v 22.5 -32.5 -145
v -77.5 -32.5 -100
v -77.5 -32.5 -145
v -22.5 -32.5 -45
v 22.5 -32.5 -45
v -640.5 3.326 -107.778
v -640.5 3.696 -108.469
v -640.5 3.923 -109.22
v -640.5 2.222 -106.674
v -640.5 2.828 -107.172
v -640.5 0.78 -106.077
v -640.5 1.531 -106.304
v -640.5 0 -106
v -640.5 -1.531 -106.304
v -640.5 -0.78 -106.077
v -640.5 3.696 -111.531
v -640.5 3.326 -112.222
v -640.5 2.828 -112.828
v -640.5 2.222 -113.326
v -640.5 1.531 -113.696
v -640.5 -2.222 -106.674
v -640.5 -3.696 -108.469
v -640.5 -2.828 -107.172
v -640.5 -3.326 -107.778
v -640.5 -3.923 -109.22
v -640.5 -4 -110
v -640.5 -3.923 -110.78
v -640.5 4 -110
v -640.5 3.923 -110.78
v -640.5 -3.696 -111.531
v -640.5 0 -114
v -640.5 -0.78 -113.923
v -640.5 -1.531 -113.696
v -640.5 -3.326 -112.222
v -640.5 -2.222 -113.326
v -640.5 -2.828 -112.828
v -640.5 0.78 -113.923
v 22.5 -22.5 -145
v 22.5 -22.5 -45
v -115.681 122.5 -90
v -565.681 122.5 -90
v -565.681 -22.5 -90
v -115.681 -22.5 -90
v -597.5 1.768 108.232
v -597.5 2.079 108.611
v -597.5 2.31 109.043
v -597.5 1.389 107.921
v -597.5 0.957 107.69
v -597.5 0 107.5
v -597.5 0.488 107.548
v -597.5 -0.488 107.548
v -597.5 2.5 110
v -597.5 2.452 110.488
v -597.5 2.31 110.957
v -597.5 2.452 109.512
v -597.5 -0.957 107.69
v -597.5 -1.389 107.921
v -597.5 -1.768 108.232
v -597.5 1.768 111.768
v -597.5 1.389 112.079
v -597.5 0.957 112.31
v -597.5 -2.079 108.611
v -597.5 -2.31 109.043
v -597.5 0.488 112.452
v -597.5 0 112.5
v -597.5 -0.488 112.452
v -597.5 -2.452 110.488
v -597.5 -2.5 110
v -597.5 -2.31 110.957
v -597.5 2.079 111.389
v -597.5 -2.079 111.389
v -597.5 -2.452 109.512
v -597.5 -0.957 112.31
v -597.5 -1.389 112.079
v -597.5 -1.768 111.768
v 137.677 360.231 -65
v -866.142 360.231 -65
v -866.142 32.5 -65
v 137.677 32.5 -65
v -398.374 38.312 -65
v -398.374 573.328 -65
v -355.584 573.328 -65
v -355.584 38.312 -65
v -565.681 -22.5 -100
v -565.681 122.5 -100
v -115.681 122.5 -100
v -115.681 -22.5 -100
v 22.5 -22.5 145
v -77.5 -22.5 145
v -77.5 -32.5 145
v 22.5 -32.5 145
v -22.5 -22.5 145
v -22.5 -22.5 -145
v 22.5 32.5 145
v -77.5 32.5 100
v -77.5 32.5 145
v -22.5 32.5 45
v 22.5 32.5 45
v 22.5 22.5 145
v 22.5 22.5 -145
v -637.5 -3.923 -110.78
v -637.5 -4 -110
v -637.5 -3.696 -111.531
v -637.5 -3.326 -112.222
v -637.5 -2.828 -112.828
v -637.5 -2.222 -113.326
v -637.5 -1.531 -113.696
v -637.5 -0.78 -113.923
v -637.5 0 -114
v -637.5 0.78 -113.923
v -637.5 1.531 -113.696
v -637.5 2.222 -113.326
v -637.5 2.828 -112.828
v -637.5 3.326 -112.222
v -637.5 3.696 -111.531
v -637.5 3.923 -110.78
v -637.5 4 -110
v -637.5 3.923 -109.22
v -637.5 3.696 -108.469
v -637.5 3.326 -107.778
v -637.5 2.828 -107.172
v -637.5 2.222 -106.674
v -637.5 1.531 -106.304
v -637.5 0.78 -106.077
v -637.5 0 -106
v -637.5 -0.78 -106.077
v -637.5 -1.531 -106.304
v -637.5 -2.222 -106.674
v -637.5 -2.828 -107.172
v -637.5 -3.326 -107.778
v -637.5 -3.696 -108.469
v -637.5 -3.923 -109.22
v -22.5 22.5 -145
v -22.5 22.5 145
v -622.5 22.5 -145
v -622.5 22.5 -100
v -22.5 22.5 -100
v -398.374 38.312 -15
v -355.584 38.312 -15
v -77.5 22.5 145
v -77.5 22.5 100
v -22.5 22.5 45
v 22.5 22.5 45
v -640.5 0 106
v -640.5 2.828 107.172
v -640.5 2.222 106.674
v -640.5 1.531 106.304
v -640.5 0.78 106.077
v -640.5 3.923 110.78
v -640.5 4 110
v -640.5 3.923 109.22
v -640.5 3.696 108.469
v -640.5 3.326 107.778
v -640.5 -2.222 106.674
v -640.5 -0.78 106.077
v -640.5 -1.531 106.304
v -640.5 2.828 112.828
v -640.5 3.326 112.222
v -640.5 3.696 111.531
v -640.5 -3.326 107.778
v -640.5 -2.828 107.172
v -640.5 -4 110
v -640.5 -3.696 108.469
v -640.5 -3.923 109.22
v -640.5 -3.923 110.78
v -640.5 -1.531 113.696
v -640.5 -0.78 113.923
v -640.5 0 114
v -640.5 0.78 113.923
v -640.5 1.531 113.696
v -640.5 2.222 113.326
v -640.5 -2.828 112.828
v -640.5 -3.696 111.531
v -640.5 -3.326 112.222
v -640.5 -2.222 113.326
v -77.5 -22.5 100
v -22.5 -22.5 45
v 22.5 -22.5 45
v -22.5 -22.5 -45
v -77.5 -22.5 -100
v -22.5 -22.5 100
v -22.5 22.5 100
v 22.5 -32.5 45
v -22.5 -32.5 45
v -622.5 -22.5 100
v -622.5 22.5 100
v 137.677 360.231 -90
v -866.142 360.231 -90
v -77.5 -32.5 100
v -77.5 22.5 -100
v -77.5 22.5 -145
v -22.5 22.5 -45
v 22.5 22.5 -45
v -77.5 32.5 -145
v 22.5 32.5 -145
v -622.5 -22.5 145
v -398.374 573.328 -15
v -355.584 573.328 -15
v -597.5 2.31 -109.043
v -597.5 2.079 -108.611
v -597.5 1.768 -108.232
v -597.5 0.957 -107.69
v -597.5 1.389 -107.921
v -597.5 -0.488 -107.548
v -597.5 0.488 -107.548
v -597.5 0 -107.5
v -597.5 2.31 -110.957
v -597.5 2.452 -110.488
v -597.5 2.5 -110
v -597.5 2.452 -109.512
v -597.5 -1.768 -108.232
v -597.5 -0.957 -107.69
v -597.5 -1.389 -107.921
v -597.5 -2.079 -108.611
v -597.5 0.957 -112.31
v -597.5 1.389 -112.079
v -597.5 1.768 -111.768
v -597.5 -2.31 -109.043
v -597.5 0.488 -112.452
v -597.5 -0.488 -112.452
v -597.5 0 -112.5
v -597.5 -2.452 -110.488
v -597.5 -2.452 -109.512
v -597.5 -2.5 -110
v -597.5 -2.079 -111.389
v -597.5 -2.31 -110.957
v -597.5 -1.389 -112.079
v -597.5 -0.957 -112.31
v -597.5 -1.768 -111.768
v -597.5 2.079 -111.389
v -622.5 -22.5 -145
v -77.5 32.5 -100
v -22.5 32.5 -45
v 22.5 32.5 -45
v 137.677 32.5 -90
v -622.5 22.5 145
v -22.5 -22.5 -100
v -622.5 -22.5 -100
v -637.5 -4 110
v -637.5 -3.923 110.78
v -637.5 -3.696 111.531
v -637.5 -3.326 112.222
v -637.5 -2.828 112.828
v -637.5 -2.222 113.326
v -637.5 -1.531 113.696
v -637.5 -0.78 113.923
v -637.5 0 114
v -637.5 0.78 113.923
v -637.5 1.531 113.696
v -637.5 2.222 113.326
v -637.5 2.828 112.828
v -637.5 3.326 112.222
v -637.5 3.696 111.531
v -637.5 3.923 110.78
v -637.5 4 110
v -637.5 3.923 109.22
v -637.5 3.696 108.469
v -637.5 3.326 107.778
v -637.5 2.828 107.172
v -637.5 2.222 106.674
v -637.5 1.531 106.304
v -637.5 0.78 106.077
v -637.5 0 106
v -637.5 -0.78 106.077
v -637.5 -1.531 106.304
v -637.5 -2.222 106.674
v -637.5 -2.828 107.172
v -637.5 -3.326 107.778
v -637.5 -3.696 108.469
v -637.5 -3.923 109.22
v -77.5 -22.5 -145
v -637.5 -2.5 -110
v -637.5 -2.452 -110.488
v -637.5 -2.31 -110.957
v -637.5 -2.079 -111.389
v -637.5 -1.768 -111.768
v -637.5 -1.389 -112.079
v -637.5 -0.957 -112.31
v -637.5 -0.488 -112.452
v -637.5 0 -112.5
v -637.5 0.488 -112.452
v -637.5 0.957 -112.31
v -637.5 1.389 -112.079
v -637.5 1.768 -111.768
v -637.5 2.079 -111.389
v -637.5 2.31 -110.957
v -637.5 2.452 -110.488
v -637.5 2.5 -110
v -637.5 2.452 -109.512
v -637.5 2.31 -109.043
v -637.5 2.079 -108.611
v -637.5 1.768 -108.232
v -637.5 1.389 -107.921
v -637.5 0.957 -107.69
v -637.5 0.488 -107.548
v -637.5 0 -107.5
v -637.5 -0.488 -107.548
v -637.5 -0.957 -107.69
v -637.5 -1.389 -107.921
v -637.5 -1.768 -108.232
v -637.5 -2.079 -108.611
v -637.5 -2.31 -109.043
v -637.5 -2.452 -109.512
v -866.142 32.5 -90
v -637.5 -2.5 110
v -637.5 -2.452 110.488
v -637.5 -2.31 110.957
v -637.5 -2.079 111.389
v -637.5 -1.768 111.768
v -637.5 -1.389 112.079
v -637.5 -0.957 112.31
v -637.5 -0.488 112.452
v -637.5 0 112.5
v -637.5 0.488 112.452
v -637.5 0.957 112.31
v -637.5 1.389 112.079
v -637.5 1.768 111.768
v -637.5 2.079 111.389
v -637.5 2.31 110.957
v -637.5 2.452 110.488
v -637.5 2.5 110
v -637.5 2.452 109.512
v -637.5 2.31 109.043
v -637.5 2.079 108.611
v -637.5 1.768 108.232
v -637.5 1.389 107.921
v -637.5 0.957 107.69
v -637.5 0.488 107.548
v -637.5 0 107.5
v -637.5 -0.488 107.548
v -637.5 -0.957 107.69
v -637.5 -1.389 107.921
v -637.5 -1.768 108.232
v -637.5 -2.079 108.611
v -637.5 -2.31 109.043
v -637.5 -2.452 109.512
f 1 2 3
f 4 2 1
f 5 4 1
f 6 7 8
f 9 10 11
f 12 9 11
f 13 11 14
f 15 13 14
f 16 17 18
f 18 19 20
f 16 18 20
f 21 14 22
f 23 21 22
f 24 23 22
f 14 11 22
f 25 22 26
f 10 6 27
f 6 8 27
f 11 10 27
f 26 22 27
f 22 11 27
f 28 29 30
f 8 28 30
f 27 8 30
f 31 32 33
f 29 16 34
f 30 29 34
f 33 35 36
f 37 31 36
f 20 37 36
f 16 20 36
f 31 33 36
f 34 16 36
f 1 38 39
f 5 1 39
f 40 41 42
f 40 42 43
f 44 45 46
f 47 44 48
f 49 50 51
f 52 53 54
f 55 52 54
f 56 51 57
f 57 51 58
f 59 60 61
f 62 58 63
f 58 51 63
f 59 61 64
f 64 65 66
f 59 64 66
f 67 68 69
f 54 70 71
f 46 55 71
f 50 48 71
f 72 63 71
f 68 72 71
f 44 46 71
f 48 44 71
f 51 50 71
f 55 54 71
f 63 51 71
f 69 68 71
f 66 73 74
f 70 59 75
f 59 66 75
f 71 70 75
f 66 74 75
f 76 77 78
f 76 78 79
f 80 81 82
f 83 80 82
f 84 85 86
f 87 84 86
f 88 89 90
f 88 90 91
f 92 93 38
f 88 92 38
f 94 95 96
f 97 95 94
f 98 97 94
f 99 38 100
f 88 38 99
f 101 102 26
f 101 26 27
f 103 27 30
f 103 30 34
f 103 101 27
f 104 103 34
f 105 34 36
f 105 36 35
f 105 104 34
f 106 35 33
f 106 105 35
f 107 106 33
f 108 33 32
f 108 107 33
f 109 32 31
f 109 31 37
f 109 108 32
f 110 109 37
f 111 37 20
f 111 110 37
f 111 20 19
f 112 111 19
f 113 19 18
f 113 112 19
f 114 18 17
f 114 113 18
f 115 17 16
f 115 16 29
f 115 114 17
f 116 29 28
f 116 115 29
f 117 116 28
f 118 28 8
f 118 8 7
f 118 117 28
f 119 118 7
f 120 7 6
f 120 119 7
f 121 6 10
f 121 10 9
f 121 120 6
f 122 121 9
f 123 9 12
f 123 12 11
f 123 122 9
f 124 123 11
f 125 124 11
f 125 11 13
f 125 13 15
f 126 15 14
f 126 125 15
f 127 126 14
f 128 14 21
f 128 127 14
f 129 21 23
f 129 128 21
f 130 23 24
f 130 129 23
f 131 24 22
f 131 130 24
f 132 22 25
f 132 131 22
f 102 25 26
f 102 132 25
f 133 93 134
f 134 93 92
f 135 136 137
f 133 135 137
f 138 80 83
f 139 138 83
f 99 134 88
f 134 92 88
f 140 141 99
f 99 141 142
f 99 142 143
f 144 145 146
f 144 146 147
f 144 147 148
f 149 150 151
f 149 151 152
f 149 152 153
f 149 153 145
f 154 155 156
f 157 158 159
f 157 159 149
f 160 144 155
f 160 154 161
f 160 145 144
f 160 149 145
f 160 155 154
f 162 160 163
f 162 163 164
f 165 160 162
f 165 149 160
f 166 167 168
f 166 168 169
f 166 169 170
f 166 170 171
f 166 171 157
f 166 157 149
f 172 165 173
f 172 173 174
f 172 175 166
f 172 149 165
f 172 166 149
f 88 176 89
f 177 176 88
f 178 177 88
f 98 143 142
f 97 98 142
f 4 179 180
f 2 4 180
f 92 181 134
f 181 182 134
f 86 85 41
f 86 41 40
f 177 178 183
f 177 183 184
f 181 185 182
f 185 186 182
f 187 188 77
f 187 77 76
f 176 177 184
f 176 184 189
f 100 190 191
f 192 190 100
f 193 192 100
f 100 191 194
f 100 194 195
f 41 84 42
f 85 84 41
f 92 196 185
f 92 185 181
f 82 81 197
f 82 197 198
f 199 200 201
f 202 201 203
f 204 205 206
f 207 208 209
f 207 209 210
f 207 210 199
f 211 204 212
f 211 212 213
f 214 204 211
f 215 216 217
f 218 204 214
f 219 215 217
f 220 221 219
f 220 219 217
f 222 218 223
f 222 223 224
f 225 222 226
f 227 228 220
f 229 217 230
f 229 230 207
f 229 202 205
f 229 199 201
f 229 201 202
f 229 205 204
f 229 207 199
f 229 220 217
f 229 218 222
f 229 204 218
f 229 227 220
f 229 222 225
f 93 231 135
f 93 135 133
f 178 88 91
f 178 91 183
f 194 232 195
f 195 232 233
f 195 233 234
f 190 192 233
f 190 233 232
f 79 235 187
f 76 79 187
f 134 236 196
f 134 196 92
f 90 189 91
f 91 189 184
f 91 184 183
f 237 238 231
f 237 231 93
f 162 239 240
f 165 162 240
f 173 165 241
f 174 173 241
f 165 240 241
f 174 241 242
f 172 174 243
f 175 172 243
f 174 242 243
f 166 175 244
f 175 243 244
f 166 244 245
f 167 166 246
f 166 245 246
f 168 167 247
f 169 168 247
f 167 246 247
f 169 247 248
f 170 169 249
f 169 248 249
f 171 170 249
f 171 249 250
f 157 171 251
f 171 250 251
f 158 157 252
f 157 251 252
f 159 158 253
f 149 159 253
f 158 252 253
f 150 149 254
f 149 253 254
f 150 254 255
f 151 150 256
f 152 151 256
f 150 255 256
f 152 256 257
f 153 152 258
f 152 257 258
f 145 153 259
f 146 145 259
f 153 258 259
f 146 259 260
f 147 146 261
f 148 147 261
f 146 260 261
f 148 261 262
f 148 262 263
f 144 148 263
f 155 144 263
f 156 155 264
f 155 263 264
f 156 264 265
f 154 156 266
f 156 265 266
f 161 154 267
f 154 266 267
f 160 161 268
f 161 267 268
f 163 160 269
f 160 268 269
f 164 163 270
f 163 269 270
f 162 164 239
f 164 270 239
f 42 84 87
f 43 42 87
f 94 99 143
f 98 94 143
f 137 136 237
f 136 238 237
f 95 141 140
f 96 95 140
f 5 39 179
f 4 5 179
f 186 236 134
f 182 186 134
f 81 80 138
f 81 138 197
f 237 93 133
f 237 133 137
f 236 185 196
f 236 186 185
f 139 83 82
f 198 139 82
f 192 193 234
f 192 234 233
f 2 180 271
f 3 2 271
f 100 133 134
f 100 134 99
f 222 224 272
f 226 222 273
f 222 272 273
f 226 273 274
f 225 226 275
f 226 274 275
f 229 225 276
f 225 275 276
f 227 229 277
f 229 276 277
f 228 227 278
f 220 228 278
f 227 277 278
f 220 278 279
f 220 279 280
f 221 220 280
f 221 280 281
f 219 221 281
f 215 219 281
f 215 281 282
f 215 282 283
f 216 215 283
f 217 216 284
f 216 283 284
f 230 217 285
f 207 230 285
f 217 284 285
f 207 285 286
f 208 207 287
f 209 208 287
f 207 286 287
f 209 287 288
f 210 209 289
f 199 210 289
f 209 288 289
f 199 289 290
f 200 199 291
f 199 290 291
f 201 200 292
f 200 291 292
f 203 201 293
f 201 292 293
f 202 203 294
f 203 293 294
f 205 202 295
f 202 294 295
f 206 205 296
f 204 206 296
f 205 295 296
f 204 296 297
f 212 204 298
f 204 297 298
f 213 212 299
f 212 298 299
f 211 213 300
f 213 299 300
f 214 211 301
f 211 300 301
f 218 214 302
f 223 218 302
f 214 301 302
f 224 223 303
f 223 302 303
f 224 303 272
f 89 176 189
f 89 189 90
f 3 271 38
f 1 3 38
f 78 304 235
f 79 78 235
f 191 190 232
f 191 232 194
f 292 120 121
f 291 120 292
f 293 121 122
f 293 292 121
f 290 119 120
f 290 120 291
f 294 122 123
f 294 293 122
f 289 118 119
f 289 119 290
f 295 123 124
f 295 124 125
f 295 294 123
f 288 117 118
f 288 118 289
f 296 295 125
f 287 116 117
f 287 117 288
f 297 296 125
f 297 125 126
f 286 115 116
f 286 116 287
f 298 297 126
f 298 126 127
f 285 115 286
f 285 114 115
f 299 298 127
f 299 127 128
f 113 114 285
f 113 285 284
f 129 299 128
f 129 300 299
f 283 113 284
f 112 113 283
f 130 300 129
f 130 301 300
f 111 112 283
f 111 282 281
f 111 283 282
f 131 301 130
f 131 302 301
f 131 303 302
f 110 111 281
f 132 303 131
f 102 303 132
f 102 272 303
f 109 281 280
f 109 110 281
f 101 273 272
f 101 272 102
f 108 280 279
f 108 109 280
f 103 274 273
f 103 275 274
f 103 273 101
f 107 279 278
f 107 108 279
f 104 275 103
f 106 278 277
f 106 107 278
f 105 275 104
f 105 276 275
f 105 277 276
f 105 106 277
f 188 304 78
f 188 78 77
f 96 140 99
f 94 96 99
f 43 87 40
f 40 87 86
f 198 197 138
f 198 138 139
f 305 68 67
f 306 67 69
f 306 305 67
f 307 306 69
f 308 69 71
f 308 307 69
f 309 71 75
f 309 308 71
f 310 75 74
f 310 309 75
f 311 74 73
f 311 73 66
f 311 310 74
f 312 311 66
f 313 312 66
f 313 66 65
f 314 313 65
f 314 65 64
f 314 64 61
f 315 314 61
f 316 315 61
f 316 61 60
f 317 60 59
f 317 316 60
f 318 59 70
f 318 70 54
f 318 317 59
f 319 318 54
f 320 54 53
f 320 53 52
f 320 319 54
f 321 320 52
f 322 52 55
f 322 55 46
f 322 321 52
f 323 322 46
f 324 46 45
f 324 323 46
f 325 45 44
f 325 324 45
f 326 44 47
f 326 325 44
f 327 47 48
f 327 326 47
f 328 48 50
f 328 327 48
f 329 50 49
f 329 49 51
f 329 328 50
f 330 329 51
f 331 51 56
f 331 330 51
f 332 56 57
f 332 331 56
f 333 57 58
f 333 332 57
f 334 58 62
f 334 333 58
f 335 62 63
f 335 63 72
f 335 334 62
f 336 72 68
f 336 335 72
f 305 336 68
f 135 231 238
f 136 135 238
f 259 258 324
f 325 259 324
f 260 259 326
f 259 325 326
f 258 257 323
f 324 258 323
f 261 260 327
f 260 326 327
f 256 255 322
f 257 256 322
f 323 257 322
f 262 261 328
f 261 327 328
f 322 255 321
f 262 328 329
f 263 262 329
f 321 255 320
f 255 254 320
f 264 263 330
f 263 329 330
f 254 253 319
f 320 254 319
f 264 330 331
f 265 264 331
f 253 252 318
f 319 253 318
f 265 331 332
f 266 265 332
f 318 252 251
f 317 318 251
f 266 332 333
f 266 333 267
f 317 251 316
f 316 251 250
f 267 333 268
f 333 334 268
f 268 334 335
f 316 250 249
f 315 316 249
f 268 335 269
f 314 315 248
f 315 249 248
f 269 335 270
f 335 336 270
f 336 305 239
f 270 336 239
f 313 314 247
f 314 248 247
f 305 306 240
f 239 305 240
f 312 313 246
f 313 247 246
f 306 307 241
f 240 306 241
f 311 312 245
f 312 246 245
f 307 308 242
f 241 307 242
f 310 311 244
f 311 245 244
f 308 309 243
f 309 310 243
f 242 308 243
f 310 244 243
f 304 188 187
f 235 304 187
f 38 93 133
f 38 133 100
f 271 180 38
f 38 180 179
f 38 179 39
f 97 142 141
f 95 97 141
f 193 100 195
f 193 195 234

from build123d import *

# Parameters (mm, degrees)
F0_W          = 45
F0_H          = 290
F1_DEPTH      = 22.5
F2_W          = 600
F2_H          = 45
F3_DEPTH      = 22.5
F5_DEPTH      = 10
F8_R          = 2.5
F9_DEPTH      = 15
F9_DEPTH_BACK = 25
F10_R         = 4
F11_DEPTH     = 3
F13_W         = 450
F13_H         = 145
F14_DEPTH     = 10
F15_W         = 1003.819286
F15_H         = 327.730939
F16_DEPTH     = 25
F17_W         = 42.789608
F17_H         = 535.016
F18_DEPTH     = 50


with BuildPart() as f1:
    # F0 (on Front) → F1 (new body, symmetric)
    with BuildSketch(Plane.XZ):
        Rectangle(F0_W, F0_H)
    extrude(amount=F1_DEPTH, both=True)


with BuildPart() as f3:
    # F2 (on Front) → F3 (new body, symmetric)
    with BuildSketch(Plane.XZ):
        with Locations((-322.5, 122.5)):
            Rectangle(F2_W, F2_H)
        with Locations((-322.5, -122.5)):
            Rectangle(F2_W, F2_H)
    extrude(amount=F3_DEPTH, both=True)


with BuildPart() as f5:
    # F4 (on face) → F5 (new body)
    with BuildSketch(Plane.XZ.offset(22.5)):
        Polygon((-77.5, -145), (22.5, -145), (22.5, -45), (-22.5, -45), (-77.5, -100), align=None)
    extrude(amount=F5_DEPTH)


with BuildPart() as f6_1:
    # F6: instance of F5
    add(f5.part.mirror(Plane.XZ))


with BuildPart() as f7_1:
    # F7: instance of F5
    add(f5.part.mirror(Plane.XY))


with BuildPart() as f7_2:
    # F7: instance of F6_1
    add(f6_1.part.mirror(Plane.XY))


with BuildPart() as f9:
    # F8 (on face) → F9 (new body, two sides)
    with BuildSketch(Plane(origin=(-622.5, 0, 0), x_dir=(0, -1, 0), z_dir=(-1, 0, 0))) as f9_sk:
        with Locations((0, 110)):
            Circle(F8_R)
    extrude(amount=F9_DEPTH)
    extrude(f9_sk.sketch, amount=-F9_DEPTH_BACK)

    # F10 (on face) → F11 (join)
    with BuildSketch(Plane(origin=(-637.5, 0, 0), x_dir=(0, -1, 0), z_dir=(-1, 0, 0))):
        with Locations((0, 110)):
            Circle(F10_R)
    extrude(amount=F11_DEPTH)


with BuildPart() as f12_1:
    # F12: instance of F9
    add(f9.part.mirror(Plane.XY))


with BuildPart() as f14:
    # F13 (on face) → F14 (new body)
    with BuildSketch(Plane.XY.offset(-100)):
        with Locations((-340.681428, 50)):
            Rectangle(F13_W, F13_H)
    extrude(amount=F14_DEPTH)


with BuildPart() as f16:
    # F15 (on face) → F16 (new body)
    with BuildSketch(Plane.XY.offset(-90)):
        with Locations((-364.23257, 196.365469)):
            Rectangle(F15_W, F15_H)
    extrude(amount=F16_DEPTH)


with BuildPart() as f18:
    # F17 (on face) → F18 (new body)
    with BuildSketch(Plane.XY.offset(-65)):
        with Locations((-376.979247, 305.81972)):
            Rectangle(F17_W, F17_H)
    extrude(amount=F18_DEPTH)


solid = Compound([f1.part, f3.part, f5.part, f6_1.part, f7_1.part, f7_2.part, f9.part, f12_1.part, f14.part, f16.part, f18.part])
